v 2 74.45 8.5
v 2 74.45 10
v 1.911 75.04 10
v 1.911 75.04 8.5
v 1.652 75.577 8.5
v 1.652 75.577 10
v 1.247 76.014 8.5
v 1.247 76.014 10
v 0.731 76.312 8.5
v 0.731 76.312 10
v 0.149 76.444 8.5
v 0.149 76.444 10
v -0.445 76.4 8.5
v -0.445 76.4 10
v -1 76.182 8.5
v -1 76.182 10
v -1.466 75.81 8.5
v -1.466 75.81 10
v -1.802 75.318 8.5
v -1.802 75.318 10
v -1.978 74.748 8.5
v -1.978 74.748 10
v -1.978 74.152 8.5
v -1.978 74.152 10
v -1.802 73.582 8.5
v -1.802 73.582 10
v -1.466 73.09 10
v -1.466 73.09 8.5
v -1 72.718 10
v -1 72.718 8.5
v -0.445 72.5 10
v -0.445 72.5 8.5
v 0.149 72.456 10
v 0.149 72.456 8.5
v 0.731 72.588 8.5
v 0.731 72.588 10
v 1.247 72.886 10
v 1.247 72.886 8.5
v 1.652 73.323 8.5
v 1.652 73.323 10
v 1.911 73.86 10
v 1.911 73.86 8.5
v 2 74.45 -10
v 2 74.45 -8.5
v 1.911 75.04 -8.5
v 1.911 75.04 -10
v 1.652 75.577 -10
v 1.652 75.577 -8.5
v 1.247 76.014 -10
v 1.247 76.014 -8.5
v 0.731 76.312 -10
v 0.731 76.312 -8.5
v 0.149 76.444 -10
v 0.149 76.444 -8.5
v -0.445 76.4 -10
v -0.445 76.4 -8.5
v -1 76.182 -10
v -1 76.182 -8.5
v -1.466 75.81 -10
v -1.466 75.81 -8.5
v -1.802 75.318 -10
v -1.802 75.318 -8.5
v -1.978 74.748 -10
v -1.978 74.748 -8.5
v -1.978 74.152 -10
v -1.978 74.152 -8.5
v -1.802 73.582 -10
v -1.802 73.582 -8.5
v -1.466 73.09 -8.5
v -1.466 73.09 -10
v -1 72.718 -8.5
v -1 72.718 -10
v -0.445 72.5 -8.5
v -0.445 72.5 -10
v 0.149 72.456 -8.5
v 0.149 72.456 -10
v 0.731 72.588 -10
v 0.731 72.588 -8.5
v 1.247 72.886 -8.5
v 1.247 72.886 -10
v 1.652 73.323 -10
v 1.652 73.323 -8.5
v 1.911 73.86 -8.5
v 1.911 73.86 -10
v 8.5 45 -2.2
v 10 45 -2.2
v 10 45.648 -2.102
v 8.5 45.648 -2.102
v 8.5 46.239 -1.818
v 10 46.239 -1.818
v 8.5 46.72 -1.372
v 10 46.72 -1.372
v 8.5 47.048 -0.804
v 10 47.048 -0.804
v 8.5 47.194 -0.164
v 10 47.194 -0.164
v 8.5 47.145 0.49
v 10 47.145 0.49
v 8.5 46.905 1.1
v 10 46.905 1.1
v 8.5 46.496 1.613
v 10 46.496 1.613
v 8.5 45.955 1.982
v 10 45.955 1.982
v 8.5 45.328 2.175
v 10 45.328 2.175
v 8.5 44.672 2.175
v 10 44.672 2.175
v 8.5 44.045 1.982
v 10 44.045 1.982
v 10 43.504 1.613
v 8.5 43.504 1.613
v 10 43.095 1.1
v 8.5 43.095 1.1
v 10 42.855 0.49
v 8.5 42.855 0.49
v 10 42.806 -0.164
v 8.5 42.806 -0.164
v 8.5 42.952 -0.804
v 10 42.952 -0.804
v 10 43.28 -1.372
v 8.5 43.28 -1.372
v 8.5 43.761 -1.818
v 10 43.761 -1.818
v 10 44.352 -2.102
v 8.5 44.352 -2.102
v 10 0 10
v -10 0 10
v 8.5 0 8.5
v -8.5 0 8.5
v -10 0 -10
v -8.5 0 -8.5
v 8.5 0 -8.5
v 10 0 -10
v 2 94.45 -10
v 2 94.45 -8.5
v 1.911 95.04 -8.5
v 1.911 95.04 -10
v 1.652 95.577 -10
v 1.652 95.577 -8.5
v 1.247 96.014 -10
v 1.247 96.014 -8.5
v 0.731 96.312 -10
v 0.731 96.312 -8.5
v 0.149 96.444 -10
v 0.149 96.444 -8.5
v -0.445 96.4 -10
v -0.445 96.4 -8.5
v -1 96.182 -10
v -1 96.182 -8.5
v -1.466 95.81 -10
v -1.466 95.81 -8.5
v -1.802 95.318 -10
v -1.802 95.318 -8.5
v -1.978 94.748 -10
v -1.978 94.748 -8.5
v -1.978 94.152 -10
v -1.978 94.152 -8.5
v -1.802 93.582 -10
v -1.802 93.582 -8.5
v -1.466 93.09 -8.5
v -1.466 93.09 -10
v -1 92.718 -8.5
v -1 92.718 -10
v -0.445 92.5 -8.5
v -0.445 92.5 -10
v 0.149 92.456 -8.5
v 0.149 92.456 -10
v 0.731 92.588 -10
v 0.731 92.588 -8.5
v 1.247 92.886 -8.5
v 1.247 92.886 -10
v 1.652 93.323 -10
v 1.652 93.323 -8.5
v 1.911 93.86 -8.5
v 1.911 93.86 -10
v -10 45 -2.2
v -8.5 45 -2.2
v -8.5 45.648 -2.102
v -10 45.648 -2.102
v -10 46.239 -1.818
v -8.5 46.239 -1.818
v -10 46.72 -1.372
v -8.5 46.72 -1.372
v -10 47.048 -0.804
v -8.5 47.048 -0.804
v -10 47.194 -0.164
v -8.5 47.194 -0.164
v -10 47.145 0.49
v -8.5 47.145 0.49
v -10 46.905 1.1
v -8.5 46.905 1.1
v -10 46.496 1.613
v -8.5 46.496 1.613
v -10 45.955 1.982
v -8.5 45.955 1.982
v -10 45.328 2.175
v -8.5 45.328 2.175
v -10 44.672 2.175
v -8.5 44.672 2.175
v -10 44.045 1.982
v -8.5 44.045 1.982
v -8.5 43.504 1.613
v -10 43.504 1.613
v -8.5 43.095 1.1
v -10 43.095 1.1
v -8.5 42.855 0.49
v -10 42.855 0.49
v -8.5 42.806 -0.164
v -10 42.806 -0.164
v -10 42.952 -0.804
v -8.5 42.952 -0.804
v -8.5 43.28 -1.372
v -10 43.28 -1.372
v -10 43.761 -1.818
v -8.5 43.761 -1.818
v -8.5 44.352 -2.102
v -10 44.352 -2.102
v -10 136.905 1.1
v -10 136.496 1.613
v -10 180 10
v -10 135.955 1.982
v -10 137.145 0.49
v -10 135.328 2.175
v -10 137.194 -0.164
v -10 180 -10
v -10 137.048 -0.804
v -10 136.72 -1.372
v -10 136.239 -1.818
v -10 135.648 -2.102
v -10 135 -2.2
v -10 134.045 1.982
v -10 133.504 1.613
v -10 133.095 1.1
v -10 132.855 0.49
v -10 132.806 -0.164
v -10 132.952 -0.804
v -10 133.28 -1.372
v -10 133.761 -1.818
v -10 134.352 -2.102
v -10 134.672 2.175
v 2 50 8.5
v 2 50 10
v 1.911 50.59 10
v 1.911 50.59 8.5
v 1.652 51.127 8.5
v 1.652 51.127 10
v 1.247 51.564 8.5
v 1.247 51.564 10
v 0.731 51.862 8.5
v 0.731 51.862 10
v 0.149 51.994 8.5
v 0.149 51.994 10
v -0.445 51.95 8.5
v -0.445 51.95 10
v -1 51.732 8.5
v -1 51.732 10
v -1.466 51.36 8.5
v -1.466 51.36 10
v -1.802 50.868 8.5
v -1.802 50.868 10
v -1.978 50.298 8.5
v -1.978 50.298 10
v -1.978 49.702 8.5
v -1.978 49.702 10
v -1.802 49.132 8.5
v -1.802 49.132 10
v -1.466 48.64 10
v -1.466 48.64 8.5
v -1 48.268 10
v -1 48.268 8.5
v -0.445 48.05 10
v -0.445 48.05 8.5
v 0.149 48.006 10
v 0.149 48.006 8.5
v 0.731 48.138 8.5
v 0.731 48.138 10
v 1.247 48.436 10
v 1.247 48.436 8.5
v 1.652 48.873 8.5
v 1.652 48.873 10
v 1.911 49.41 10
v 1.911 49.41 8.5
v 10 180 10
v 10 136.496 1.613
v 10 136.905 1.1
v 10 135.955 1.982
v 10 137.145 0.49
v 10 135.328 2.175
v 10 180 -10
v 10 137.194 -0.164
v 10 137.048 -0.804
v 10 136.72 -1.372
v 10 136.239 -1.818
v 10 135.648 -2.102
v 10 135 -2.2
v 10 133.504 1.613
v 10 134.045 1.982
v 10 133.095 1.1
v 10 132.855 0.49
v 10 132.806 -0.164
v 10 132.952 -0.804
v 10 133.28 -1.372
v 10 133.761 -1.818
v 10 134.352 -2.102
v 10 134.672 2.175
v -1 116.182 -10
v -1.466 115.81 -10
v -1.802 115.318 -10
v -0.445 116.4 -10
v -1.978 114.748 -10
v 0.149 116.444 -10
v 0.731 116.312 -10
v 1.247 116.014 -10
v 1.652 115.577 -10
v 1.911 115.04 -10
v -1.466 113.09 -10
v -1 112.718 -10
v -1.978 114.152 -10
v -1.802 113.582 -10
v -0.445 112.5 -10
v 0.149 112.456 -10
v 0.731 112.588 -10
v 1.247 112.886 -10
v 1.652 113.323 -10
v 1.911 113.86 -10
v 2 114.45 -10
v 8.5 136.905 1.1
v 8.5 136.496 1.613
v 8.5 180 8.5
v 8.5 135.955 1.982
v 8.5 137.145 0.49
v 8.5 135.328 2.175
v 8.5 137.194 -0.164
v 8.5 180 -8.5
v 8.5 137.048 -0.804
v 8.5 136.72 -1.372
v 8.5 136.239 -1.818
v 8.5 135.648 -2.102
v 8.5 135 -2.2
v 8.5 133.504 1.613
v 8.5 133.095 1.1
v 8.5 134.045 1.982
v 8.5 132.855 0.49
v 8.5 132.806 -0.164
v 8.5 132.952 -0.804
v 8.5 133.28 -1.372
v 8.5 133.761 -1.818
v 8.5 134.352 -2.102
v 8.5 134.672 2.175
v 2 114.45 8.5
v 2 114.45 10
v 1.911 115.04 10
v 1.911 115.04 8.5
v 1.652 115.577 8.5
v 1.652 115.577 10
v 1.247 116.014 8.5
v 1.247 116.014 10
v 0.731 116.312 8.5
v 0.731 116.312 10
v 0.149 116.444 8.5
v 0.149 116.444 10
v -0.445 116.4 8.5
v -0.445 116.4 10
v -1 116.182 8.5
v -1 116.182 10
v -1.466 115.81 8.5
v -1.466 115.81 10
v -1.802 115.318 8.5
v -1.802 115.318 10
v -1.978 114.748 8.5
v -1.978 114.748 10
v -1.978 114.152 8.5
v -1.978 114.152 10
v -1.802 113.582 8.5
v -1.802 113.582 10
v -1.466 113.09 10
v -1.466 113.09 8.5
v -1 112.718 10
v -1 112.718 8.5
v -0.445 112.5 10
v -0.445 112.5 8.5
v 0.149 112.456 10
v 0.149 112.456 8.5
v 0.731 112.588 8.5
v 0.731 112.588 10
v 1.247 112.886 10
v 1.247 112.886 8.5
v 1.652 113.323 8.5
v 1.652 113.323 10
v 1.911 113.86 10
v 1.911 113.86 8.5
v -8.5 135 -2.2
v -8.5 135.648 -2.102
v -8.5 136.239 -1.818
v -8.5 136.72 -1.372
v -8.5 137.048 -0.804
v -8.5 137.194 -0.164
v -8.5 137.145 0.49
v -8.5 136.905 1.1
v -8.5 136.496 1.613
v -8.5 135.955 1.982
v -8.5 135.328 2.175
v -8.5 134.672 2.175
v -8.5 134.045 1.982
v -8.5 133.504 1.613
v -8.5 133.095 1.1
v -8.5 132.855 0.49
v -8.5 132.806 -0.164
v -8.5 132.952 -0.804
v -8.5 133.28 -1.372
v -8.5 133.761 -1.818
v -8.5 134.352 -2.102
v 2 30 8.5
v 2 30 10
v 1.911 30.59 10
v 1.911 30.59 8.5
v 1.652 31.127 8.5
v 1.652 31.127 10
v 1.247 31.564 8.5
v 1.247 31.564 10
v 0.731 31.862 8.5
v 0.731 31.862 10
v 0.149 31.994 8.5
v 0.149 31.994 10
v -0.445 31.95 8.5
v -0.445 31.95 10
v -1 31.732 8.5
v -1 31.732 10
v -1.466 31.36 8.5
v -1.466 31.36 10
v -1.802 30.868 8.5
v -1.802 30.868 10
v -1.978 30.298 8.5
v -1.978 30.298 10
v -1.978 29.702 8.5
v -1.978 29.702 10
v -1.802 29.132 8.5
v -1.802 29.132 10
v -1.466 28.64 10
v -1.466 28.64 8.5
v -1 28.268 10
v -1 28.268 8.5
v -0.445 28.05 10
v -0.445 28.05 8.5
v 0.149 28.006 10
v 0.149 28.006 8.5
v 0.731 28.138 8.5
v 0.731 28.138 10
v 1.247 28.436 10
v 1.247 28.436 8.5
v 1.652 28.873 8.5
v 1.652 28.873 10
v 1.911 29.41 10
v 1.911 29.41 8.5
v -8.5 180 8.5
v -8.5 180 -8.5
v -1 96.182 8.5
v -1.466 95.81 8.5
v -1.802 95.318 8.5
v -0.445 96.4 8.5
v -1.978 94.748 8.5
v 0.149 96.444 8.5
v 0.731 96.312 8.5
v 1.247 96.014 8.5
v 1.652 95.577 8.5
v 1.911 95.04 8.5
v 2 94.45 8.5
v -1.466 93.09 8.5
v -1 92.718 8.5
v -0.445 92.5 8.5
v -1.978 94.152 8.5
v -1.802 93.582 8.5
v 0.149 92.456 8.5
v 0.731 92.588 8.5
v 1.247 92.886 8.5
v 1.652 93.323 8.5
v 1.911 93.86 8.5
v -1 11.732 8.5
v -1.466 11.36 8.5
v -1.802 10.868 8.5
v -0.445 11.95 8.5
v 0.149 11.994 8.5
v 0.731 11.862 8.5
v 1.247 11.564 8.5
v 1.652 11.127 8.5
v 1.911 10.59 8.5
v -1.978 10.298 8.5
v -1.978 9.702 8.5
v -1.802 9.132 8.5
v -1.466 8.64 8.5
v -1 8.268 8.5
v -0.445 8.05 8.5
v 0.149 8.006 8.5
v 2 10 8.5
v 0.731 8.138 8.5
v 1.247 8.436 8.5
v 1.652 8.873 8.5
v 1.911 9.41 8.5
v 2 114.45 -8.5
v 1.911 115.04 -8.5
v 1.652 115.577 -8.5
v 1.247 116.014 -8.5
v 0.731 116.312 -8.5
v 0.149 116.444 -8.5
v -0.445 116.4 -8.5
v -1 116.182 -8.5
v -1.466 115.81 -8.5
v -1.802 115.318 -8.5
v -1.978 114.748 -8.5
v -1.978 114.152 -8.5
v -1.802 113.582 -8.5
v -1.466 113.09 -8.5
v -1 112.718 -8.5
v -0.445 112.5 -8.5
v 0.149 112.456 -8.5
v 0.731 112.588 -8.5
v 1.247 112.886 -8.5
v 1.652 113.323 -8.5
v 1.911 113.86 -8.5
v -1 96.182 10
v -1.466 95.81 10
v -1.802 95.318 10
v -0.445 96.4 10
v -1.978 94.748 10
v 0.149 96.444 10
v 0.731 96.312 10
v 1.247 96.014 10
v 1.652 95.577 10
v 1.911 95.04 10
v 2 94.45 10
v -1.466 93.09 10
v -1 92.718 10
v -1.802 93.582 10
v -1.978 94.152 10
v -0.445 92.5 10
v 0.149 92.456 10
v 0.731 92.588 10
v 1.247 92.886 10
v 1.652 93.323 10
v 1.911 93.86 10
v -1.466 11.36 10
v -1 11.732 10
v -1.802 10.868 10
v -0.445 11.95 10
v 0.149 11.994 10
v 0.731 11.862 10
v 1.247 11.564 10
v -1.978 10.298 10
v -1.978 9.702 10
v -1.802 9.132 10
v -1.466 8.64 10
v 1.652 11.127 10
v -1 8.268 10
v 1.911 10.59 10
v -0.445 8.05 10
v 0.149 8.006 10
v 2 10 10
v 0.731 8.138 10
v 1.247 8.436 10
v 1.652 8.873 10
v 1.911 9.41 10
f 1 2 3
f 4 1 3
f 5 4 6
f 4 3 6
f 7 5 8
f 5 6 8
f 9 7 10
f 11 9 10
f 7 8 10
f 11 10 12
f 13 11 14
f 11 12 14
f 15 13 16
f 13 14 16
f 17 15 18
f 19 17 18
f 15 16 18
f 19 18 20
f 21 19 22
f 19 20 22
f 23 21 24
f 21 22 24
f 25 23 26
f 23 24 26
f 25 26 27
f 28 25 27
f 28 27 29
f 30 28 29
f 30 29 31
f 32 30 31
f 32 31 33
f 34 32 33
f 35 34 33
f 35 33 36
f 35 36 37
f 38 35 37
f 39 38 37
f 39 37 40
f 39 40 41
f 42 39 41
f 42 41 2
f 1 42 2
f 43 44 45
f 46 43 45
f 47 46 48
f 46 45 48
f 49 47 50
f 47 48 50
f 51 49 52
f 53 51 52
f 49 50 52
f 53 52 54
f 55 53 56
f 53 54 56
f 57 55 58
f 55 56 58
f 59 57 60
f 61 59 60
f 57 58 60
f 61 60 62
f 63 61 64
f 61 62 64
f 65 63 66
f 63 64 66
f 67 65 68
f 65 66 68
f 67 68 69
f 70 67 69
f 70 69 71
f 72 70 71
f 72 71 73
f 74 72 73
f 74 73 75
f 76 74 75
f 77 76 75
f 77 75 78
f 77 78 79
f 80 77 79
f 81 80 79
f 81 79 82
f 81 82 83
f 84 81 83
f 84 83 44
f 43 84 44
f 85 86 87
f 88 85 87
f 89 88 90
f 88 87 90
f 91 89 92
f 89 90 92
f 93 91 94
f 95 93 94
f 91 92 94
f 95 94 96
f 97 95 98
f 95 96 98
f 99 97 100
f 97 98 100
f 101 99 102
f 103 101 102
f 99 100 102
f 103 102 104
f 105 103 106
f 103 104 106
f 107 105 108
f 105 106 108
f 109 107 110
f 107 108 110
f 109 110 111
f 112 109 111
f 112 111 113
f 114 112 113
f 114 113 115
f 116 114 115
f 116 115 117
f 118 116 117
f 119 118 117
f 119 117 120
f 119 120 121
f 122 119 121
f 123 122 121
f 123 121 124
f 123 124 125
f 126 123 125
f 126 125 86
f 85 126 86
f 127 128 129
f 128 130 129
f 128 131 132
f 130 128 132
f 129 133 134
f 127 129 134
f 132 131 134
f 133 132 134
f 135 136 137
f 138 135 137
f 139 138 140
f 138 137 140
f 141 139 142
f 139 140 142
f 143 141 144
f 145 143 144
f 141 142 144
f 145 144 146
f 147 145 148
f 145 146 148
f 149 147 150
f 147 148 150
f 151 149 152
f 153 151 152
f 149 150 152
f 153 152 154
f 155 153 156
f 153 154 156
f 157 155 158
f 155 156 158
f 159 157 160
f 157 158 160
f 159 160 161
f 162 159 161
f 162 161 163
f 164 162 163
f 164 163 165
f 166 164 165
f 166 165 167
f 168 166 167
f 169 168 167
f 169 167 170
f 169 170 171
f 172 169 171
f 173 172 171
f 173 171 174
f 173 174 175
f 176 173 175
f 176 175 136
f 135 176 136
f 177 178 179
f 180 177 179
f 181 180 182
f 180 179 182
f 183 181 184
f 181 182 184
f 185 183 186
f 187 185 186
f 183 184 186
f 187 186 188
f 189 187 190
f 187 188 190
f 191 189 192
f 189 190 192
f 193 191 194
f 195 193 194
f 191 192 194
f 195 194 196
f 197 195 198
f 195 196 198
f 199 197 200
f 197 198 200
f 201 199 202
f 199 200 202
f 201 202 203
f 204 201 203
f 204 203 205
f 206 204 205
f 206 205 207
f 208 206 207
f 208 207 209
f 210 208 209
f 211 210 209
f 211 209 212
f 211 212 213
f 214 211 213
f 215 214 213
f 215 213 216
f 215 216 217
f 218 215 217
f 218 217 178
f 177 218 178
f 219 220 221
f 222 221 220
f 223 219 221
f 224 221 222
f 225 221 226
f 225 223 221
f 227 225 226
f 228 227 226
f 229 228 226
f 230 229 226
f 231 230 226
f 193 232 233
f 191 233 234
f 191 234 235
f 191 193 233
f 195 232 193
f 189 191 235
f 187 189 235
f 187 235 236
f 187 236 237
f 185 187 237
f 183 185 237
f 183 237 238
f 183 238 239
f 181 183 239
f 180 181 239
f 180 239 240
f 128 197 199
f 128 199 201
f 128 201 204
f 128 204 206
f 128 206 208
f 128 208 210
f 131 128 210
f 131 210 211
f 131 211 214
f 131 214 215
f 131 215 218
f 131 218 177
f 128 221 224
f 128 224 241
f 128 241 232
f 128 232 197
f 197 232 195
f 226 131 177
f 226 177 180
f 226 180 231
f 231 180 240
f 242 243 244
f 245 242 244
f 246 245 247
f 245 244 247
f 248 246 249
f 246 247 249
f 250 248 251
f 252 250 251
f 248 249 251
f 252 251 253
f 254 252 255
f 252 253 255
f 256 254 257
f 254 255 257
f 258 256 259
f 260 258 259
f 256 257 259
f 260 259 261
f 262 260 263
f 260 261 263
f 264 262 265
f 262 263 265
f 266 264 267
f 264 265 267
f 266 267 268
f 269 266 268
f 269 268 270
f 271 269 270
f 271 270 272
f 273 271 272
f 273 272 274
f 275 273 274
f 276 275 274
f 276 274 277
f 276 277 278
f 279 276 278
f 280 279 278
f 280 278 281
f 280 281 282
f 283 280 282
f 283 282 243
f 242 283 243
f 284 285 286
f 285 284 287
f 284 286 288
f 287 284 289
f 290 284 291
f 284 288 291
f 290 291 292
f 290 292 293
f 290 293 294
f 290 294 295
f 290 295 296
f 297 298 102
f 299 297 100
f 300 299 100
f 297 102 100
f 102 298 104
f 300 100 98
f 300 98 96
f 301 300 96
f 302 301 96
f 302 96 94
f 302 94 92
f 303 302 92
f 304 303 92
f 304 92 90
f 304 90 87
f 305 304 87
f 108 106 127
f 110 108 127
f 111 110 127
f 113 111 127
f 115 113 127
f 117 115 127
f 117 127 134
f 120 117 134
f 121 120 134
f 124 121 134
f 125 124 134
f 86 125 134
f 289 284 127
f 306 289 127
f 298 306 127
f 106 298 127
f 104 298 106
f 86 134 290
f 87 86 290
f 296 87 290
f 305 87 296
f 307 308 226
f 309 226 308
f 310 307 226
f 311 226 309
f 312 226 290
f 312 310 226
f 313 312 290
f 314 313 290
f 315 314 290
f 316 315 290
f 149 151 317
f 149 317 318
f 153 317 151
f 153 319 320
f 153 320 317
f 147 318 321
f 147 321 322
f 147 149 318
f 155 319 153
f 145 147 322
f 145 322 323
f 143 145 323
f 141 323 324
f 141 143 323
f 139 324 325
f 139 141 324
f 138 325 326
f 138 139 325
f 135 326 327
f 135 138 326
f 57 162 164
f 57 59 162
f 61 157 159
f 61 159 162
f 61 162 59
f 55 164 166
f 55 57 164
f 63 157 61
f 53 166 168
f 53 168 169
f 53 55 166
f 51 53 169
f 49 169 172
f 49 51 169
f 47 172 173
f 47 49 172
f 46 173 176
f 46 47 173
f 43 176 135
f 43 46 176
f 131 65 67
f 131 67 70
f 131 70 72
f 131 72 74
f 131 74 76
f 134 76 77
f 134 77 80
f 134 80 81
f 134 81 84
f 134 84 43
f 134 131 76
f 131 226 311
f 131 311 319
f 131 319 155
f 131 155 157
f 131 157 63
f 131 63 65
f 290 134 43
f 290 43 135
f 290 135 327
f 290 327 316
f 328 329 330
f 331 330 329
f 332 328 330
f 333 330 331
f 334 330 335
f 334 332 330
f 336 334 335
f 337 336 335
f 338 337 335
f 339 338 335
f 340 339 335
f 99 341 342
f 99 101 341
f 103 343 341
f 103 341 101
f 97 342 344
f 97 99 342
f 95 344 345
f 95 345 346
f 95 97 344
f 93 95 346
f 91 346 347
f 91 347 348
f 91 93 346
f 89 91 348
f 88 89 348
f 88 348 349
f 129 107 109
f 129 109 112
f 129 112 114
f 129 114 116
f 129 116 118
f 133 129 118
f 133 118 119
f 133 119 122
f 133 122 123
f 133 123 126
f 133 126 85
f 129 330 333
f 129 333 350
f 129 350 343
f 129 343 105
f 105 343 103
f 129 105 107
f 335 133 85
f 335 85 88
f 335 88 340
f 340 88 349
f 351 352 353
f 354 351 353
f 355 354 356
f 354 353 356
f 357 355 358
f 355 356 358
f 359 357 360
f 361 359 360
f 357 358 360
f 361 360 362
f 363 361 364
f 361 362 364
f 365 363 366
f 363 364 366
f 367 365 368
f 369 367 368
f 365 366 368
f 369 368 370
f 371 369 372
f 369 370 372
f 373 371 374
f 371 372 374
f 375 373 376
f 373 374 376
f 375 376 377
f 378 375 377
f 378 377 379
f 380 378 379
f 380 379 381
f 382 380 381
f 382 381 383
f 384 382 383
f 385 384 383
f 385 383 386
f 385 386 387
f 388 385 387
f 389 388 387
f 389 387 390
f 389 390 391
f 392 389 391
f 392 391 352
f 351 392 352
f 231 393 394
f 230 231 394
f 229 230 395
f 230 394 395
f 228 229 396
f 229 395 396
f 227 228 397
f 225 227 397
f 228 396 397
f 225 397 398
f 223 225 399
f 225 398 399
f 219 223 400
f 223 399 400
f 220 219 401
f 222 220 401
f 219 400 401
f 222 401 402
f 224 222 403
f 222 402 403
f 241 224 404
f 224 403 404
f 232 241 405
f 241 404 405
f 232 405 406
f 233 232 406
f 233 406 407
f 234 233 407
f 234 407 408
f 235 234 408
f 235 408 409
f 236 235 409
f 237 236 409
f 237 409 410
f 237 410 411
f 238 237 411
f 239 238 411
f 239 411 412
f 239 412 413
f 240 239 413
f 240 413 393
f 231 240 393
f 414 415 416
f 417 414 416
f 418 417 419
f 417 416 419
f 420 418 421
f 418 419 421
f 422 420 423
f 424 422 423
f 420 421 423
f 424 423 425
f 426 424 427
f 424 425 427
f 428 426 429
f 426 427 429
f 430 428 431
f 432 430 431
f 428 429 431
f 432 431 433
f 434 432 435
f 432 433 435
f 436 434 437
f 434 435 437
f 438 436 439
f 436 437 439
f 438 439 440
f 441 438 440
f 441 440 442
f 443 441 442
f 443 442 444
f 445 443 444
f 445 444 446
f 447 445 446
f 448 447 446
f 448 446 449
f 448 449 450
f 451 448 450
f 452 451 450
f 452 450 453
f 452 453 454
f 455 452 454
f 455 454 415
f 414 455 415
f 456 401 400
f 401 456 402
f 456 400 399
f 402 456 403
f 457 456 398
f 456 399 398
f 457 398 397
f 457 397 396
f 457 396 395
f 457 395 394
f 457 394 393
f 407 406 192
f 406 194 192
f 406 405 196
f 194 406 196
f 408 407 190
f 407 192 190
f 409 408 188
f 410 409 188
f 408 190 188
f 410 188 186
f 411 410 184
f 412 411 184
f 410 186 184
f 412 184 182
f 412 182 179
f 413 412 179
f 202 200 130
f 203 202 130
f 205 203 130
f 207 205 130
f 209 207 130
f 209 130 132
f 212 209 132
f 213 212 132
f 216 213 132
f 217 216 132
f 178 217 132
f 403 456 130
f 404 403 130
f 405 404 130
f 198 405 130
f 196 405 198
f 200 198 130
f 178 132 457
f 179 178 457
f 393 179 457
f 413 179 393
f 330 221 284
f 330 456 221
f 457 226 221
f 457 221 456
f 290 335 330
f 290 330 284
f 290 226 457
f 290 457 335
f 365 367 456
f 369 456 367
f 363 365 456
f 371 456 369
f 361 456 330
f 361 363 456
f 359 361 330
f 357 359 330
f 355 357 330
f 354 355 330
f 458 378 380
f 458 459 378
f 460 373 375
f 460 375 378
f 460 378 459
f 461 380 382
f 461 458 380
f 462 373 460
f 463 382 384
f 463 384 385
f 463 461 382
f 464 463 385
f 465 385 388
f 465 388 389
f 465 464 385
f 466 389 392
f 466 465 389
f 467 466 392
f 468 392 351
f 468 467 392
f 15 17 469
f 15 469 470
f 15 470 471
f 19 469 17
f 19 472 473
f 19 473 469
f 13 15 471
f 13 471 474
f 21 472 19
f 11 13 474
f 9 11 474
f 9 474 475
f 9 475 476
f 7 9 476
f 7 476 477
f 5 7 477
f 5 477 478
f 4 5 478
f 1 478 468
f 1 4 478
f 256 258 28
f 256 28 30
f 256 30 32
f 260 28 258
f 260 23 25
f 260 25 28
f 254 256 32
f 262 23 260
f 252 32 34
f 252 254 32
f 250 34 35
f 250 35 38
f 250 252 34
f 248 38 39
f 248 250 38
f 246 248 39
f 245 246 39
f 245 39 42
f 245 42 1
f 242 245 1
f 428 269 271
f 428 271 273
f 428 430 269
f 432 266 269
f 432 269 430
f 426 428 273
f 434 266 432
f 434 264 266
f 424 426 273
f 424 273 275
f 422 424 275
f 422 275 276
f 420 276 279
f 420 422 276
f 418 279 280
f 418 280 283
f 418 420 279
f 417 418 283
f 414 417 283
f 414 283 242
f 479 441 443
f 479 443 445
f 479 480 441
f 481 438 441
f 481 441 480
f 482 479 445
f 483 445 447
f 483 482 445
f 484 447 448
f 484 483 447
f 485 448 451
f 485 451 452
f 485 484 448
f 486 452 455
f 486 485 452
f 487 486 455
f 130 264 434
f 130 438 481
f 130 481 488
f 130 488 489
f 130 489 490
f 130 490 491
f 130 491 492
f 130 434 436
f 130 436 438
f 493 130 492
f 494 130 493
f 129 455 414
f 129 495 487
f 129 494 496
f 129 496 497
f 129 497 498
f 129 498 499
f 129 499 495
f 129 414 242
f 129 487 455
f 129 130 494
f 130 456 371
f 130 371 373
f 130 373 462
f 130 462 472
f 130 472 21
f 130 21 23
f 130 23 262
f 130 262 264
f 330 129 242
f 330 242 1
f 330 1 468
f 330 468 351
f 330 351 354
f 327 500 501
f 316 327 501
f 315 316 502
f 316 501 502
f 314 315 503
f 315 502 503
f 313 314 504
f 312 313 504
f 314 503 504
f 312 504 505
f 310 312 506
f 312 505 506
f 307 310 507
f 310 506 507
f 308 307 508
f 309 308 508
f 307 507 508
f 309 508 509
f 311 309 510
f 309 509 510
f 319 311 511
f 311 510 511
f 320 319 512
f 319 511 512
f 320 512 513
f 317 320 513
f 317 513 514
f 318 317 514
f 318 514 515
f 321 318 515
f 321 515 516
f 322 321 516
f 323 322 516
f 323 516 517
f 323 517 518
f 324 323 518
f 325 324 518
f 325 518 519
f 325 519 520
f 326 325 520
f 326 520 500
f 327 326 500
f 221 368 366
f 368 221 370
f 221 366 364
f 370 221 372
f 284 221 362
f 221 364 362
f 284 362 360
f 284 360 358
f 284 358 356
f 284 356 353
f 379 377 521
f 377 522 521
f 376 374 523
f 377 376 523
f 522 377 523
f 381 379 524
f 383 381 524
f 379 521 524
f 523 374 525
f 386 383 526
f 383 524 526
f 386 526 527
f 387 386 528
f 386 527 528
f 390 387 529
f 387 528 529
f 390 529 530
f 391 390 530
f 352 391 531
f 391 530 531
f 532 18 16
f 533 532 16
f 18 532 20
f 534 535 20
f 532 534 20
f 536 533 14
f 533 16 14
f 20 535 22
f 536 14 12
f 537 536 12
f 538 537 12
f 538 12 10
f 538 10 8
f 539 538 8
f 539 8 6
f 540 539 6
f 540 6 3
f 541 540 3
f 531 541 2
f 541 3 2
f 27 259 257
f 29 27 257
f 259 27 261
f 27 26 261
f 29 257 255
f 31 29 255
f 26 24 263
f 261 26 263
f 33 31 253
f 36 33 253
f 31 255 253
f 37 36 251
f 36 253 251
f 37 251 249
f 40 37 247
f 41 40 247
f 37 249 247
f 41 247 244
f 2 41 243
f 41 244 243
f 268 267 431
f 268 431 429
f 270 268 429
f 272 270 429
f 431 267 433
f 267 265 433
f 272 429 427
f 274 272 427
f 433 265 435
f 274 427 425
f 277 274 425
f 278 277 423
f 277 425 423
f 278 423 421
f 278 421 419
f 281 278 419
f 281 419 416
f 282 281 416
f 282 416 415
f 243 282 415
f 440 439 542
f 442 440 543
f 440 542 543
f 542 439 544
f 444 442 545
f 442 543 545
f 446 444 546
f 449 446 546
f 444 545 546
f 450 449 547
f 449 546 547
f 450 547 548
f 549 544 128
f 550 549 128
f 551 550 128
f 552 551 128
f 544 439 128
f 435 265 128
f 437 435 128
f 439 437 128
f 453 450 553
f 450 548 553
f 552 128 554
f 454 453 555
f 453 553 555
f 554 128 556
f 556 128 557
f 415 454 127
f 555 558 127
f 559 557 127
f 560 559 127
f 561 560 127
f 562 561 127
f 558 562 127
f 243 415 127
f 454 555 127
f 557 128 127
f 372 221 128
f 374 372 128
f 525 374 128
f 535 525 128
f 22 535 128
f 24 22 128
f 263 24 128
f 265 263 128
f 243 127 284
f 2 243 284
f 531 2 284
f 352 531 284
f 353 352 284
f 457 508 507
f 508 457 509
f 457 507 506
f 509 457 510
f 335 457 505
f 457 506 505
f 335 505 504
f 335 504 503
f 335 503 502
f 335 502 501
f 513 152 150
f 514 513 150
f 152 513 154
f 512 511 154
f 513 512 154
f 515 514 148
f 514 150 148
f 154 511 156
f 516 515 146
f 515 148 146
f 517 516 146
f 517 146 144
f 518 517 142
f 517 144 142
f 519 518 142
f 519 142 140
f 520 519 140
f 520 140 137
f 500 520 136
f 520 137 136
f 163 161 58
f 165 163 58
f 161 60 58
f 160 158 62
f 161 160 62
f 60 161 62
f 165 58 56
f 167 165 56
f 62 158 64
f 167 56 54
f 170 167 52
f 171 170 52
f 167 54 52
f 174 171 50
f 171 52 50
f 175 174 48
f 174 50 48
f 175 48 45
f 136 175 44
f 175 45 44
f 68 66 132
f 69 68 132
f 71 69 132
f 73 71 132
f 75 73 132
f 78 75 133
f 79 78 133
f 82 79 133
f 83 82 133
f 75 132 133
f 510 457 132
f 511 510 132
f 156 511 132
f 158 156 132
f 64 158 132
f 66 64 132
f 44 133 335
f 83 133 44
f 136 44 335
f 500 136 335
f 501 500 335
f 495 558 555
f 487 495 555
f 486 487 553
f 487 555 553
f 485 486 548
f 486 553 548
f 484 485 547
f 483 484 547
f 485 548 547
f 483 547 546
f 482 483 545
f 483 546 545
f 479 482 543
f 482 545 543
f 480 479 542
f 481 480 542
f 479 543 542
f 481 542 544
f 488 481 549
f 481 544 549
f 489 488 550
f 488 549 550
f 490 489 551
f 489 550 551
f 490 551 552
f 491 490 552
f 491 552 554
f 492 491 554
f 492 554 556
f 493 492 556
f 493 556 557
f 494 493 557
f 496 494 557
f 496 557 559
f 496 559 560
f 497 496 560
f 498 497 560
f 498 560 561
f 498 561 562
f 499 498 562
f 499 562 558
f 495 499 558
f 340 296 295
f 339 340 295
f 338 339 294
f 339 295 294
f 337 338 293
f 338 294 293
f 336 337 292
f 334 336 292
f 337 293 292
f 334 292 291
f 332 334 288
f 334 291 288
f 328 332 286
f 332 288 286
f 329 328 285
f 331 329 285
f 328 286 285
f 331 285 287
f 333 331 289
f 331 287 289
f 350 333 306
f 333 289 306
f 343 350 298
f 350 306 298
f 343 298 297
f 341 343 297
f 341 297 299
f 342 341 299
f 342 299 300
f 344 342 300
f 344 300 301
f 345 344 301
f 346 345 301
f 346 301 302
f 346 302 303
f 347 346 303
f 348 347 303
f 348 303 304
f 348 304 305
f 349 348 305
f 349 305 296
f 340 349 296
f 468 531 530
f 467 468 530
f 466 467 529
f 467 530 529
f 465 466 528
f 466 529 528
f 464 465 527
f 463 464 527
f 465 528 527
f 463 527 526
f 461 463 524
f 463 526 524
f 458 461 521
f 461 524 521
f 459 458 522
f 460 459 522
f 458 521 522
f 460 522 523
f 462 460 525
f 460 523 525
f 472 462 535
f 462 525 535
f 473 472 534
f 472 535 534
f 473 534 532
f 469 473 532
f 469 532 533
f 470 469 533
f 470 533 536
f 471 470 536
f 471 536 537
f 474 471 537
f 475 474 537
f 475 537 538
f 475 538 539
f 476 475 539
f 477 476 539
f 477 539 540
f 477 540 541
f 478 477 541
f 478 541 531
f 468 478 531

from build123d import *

# Parameters (mm, degrees)
SKETCH_1_W          = 20
SKETCH_1_H          = 20
SKETCH_1_W_2        = 17
SKETCH_1_H_2        = 17
EXTRUDE_1_DEPTH     = 180
SKETCH_2_R          = 2.2
CUT_EXTRUDE_1_DEPTH = 120
SKETCH_3_R          = 2
CUT_EXTRUDE_2_DEPTH = 3
SKETCH_4_R          = 2
CUT_EXTRUDE_3_DEPTH = 20


with BuildPart() as part:
    # 草图1 → 凸台-拉伸1 (new body)
    with BuildSketch(Plane(origin=(0, 0, 0), x_dir=(1, 0, 0), z_dir=(0, 1, 0))):
        Rectangle(SKETCH_1_W, SKETCH_1_H)
        Rectangle(SKETCH_1_W_2, SKETCH_1_H_2, mode=Mode.SUBTRACT)
    extrude(amount=EXTRUDE_1_DEPTH)

    # 草图2 → 切除-拉伸1 (cut)
    with BuildSketch(Plane(origin=(10, 0, 0), x_dir=(0, 0, -1), z_dir=(1, 0, 0))):
        with Locations((0, 135)):
            Circle(SKETCH_2_R)
        with Locations((0, 45)):
            Circle(SKETCH_2_R)
    extrude(amount=-CUT_EXTRUDE_1_DEPTH, mode=Mode.SUBTRACT)

    # 草图3 → 切除-拉伸2 (cut)
    with BuildSketch(Plane.XY.offset(10)):
        with Locations((0, 10)):
            Circle(SKETCH_3_R)
        with Locations((0, 30)):
            Circle(SKETCH_3_R)
        with Locations((0, 50)):
            Circle(SKETCH_3_R)
    extrude(amount=-CUT_EXTRUDE_2_DEPTH, mode=Mode.SUBTRACT)

    # 草图4 → 切除-拉伸3 (cut)
    with BuildSketch(Plane.XY.offset(10)):
        with Locations((0, 74.45)):
            Circle(SKETCH_4_R)
        with Locations((0, 94.45)):
            Circle(SKETCH_4_R)
        with Locations((0, 114.45)):
            Circle(SKETCH_4_R)
    extrude(amount=-CUT_EXTRUDE_3_DEPTH, mode=Mode.SUBTRACT)


solid = part.part
